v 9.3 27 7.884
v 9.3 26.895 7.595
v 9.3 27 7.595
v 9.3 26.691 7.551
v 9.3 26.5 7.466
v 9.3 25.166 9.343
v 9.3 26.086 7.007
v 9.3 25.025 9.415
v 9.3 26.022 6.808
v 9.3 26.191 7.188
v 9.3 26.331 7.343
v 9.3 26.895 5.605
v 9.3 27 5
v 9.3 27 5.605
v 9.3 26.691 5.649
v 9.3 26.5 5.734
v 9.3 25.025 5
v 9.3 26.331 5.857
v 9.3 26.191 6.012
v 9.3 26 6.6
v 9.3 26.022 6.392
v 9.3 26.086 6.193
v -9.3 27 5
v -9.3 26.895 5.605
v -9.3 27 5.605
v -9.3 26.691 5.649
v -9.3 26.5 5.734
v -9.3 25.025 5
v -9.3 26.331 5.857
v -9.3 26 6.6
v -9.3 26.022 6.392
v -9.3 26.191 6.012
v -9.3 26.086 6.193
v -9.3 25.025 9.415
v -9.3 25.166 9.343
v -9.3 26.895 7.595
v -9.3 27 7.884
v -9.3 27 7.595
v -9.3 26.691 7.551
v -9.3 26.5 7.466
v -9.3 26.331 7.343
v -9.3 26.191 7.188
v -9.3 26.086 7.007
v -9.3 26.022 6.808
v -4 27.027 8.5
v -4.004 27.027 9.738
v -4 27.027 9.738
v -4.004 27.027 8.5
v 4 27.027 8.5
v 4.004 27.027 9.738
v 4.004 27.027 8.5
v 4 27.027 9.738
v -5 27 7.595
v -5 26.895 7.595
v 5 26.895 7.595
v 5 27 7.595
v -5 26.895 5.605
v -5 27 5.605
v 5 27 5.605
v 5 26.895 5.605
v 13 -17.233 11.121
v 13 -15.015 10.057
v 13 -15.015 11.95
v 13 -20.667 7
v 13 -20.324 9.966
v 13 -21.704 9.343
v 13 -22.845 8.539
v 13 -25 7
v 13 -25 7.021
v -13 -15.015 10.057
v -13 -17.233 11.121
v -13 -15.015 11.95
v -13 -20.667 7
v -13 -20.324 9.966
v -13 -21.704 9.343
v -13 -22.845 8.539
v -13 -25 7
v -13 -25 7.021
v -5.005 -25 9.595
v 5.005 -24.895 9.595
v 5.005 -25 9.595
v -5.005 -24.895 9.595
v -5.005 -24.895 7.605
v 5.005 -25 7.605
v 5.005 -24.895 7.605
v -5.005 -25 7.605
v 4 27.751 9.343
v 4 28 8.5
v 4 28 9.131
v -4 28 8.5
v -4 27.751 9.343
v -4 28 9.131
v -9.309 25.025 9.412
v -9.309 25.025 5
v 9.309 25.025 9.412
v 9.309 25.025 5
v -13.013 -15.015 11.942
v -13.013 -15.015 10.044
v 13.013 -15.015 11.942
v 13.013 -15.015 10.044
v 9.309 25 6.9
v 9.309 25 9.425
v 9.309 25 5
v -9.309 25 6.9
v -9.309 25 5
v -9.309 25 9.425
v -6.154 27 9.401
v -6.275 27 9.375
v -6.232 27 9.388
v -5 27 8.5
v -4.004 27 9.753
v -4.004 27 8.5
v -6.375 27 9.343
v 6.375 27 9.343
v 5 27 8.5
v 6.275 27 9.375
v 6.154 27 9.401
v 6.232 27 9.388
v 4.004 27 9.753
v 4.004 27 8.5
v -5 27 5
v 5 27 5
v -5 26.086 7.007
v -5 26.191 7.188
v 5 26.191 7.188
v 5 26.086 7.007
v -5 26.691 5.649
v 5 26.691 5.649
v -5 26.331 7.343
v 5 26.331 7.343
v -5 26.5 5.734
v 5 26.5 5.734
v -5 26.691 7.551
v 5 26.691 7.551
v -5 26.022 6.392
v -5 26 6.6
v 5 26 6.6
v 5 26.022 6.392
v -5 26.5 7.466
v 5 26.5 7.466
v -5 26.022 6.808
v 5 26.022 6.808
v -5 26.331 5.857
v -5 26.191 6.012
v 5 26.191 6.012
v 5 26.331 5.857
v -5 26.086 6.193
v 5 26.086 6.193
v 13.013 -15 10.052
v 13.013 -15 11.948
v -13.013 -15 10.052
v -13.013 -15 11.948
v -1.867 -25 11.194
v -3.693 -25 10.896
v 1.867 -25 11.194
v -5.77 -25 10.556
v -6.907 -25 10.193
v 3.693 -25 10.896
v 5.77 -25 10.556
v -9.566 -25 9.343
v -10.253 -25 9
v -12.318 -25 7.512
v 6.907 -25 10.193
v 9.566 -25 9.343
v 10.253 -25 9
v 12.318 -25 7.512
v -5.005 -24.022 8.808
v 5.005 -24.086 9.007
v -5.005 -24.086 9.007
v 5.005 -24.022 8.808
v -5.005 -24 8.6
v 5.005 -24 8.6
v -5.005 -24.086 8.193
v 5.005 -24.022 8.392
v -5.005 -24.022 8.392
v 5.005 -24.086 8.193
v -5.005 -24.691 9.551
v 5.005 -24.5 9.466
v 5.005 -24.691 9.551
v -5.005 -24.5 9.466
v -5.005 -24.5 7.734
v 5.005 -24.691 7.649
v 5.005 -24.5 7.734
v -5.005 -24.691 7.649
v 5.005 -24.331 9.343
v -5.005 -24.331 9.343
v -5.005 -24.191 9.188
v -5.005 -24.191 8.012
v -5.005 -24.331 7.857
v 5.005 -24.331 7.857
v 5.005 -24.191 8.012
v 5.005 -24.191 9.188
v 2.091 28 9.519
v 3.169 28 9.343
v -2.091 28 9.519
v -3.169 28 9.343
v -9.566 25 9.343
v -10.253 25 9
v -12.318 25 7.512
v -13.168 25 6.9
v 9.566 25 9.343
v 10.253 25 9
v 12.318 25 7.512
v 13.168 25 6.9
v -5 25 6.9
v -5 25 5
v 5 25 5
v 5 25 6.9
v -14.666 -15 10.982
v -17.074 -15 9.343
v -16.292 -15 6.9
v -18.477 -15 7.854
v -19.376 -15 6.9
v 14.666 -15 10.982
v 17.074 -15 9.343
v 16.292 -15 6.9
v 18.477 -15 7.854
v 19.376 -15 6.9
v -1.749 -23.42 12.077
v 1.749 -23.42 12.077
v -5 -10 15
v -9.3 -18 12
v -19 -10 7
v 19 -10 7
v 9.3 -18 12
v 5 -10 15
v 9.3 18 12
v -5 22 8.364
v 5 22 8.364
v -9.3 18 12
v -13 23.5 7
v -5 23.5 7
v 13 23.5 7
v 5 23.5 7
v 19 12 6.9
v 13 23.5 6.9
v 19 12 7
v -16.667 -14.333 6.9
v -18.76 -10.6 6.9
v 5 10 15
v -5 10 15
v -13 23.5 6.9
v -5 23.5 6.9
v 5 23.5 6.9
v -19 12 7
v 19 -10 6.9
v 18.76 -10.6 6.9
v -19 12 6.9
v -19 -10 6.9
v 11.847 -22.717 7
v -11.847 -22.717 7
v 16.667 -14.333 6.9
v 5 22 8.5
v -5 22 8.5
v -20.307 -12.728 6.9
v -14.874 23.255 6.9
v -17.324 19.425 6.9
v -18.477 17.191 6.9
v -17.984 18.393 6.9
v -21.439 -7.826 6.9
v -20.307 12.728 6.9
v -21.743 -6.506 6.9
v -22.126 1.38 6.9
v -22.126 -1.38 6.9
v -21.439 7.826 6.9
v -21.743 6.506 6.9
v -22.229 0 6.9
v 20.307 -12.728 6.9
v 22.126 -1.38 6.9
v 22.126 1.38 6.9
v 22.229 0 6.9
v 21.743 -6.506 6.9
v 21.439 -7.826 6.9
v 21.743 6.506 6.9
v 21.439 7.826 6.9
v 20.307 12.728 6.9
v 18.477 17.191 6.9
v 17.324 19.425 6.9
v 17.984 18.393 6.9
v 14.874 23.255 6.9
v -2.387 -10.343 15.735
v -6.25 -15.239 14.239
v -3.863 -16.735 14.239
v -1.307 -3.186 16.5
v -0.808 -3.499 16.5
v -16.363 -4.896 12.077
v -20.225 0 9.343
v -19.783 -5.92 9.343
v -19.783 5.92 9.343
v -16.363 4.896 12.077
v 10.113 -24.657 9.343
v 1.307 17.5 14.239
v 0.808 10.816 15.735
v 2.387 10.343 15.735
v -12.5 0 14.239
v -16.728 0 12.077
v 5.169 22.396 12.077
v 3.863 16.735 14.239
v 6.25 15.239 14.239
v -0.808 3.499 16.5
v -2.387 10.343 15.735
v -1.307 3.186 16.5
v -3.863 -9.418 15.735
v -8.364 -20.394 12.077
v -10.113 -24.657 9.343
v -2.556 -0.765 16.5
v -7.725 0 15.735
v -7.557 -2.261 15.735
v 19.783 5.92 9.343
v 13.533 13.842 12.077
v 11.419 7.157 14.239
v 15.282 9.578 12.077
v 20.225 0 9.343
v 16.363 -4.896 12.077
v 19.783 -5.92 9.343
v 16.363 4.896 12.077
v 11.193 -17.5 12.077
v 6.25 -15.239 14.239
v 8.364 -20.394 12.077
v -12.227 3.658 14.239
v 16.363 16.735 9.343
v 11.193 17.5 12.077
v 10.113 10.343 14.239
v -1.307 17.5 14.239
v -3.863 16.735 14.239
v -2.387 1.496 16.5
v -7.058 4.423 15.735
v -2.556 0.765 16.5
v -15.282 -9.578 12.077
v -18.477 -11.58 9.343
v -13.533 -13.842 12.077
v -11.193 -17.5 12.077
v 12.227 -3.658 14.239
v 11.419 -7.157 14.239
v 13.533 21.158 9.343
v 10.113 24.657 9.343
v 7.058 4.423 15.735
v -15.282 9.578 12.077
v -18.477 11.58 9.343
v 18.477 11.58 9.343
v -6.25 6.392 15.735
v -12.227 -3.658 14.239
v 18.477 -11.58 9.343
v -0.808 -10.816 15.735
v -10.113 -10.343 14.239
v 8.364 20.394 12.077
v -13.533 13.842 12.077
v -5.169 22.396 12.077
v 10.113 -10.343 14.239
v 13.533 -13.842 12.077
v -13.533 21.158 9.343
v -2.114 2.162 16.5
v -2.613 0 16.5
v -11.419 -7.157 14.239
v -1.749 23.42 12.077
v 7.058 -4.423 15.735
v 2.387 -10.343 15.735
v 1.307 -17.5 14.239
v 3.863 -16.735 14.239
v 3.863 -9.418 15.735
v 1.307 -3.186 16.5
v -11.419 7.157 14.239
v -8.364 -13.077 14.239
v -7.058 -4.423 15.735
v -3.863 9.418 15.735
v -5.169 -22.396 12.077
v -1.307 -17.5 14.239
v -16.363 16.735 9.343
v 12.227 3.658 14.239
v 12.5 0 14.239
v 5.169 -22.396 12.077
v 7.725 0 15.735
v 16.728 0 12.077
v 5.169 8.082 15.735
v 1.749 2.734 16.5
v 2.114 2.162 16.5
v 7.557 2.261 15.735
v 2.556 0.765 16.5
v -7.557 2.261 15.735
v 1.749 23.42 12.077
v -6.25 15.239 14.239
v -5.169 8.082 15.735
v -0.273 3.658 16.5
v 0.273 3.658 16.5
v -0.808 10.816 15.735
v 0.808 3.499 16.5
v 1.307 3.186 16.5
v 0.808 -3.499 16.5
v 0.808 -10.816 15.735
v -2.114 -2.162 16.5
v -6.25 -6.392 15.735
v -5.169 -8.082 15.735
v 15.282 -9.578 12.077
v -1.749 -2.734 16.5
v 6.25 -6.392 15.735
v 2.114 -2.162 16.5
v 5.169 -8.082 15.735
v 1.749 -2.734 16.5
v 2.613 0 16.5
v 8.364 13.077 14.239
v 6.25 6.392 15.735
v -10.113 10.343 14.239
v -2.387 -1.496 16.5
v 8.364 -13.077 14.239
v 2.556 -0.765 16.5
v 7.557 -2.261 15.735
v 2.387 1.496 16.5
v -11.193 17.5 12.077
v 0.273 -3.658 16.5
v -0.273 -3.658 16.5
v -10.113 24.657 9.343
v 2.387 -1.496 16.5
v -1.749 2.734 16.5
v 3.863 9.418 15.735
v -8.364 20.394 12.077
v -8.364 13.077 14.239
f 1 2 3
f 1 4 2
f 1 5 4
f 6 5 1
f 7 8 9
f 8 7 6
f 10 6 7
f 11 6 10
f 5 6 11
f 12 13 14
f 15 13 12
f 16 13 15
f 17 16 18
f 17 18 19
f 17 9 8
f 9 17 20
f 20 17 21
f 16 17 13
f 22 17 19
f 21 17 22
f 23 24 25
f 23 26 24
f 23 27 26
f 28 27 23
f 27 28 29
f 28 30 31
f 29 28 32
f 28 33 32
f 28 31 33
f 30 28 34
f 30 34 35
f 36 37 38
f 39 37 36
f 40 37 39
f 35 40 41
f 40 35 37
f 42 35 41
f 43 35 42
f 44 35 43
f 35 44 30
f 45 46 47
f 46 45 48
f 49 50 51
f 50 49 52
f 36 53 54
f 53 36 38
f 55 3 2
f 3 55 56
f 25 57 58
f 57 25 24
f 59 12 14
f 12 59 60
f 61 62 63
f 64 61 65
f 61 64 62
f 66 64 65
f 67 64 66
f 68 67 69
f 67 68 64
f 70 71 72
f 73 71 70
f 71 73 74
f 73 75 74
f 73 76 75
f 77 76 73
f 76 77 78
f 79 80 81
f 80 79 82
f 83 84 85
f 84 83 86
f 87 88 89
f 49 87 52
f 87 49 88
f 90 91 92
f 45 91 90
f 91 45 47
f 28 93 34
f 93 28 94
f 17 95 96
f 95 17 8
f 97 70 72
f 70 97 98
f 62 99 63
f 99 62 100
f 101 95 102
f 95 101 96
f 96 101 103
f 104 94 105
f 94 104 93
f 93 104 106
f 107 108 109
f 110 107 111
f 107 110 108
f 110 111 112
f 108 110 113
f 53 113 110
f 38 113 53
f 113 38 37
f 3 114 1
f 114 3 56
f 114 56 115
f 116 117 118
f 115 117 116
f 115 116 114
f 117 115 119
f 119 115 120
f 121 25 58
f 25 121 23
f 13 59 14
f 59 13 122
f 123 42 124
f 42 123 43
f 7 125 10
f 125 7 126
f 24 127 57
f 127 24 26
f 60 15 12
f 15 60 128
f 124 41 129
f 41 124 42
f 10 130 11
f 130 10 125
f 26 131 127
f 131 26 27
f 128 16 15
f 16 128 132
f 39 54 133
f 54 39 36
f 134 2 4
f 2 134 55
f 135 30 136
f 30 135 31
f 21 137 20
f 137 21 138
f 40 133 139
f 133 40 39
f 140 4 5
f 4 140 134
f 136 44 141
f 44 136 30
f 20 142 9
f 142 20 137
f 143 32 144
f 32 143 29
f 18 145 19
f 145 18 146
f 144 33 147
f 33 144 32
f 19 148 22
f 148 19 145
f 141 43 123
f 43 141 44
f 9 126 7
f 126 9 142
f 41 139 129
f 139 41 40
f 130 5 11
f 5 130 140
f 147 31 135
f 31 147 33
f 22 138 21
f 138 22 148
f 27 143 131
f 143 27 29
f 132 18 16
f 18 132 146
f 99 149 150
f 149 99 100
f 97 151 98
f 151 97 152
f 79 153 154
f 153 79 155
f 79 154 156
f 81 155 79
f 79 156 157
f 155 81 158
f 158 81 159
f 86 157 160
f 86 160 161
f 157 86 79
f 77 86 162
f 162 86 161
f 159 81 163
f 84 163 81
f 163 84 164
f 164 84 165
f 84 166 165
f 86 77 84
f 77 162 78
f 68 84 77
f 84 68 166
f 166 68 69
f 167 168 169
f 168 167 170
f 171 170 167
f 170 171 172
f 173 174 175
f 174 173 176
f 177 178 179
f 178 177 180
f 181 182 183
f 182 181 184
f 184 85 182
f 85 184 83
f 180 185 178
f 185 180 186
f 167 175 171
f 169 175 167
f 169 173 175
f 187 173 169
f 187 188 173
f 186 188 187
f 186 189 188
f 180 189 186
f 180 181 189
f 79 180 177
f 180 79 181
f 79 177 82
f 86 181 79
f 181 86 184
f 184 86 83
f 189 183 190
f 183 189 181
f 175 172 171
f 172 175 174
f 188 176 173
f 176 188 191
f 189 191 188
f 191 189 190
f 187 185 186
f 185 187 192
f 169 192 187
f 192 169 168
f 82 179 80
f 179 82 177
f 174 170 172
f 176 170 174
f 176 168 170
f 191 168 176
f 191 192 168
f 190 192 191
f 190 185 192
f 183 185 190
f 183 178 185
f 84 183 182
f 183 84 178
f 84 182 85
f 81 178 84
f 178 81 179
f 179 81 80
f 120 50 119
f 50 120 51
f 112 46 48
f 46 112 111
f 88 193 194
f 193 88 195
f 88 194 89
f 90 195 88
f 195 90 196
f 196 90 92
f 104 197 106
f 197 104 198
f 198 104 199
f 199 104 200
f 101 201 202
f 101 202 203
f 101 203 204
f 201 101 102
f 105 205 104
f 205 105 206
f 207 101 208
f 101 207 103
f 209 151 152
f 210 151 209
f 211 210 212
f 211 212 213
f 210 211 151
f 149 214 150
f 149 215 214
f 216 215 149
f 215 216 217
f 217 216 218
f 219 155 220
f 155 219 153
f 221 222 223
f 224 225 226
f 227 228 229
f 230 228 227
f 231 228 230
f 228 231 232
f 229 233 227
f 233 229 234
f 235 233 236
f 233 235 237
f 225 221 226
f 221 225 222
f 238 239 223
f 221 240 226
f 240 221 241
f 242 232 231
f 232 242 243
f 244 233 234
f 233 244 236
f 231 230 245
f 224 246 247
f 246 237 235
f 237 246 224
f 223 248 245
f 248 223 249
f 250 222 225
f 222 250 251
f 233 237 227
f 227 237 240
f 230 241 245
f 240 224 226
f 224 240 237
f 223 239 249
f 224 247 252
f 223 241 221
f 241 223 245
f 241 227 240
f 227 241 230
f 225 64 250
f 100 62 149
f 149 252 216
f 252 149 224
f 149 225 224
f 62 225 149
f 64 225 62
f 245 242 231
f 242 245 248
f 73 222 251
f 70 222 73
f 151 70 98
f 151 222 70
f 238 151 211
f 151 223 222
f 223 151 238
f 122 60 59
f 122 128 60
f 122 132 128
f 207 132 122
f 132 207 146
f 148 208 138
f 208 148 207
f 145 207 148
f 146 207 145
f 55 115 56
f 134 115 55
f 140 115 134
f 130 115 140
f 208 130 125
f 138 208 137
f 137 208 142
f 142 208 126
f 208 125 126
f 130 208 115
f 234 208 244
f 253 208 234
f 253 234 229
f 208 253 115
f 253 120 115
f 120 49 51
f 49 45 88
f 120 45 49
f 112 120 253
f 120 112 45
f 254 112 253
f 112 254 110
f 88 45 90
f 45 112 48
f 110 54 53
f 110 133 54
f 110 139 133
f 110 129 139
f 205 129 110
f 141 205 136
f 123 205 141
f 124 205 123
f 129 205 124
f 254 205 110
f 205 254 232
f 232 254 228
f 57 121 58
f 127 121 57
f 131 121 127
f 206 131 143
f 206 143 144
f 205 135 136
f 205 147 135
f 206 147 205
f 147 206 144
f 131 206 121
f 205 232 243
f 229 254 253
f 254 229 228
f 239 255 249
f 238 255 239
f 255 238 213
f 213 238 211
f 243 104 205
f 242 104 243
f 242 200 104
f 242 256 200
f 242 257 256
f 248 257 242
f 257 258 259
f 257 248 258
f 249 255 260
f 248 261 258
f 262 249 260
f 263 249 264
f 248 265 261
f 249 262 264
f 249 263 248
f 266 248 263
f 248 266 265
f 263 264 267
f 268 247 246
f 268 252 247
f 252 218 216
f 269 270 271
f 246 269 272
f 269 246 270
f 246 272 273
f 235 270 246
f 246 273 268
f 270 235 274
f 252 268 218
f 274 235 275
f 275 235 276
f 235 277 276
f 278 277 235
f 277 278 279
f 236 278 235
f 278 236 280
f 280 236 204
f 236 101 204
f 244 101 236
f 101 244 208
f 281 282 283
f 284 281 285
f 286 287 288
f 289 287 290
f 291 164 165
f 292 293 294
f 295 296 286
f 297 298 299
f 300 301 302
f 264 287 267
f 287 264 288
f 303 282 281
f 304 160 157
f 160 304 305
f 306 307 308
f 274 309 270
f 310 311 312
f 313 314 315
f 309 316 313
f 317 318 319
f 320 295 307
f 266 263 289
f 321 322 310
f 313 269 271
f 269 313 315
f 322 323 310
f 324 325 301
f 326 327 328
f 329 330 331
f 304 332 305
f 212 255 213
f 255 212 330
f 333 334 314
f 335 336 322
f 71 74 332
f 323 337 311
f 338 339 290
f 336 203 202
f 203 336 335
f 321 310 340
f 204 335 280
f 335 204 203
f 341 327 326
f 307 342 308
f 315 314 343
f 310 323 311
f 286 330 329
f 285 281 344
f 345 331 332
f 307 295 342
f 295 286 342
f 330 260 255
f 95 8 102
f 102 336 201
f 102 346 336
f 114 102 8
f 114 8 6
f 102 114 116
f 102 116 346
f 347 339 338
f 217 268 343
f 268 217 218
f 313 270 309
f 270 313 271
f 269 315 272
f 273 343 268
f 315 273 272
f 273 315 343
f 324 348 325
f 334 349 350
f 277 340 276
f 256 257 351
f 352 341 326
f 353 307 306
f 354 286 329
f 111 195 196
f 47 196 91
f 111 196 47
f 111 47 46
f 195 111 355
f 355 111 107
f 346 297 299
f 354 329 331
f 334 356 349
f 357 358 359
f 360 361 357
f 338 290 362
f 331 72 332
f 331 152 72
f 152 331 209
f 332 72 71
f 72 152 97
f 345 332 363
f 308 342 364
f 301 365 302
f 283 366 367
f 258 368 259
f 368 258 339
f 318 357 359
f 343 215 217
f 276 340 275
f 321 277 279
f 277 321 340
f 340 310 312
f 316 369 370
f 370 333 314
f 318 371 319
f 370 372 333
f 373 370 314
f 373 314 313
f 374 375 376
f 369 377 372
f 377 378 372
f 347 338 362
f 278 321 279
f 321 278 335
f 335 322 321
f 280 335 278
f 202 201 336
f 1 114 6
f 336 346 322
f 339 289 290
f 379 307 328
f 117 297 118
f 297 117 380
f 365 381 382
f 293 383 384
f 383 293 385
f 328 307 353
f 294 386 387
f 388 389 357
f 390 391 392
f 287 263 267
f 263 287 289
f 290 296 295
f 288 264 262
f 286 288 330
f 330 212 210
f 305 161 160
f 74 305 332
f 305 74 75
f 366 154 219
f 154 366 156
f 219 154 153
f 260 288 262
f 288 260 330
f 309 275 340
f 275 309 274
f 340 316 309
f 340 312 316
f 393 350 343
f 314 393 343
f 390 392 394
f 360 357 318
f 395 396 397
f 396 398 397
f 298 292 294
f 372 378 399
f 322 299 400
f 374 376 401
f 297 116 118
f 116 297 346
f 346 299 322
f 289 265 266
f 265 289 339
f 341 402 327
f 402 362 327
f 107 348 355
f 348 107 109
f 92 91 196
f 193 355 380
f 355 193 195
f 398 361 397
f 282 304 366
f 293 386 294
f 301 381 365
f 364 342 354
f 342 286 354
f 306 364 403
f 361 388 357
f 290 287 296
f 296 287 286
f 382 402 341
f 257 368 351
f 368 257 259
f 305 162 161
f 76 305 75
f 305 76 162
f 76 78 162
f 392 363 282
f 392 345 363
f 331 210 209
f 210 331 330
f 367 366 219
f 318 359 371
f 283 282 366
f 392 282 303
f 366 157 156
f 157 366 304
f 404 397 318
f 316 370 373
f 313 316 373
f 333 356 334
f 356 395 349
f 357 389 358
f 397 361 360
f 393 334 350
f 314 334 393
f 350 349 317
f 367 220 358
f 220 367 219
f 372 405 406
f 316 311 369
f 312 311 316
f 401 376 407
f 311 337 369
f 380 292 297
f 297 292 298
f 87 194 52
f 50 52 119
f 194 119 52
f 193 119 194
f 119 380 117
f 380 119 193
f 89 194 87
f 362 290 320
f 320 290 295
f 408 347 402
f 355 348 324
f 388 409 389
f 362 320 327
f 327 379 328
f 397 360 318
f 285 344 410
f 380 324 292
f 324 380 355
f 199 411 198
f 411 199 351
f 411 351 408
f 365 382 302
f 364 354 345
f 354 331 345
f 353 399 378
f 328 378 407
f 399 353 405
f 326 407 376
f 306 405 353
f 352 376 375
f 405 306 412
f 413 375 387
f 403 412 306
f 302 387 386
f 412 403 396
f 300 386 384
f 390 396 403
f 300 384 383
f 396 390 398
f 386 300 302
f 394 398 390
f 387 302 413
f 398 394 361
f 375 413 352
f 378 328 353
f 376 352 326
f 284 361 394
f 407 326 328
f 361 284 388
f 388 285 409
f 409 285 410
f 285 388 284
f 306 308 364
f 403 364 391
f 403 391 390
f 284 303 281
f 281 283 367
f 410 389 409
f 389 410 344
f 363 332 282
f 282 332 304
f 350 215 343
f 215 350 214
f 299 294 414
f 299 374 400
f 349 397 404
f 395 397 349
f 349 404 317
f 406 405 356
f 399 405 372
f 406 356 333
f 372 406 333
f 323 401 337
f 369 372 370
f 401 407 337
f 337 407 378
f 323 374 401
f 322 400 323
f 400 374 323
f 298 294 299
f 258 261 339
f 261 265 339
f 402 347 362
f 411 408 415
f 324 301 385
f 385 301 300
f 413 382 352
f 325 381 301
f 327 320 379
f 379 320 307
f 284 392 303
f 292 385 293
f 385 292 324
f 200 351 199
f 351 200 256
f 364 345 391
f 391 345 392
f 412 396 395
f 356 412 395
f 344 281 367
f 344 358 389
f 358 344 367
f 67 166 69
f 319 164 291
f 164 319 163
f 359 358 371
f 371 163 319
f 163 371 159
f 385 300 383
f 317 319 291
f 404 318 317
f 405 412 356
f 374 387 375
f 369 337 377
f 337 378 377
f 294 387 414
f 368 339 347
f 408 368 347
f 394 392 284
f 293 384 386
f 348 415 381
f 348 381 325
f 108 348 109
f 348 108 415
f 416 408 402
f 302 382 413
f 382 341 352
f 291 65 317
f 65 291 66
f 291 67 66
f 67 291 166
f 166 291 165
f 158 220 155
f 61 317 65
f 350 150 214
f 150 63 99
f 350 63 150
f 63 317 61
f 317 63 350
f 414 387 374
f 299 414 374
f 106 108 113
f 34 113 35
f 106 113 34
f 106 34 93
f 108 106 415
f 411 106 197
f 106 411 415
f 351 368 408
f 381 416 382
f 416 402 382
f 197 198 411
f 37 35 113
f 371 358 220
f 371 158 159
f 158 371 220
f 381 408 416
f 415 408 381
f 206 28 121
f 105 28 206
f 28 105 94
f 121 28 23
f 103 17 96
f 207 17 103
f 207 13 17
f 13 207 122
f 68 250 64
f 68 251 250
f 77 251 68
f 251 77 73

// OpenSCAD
$fn=30;

spacer=0.4;

//case();
// translate([0,5,11]) nano();
lid();
//translate([0,5,10]) nanoTop();

module case()
{
    difference()
    {
        translate([0,0,-1]) resize(newsize=[50,70,35]) sphere(r=60, center=true);
        translate([0,0,-10]) resize(newsize=[100,140,20]) sphere(r=80, center=true);
        //translate([0,0,-50]) cube([100,100,100], center=true);
        translate([0,5,10.2]) nano();
    }
}


module lid()
{
    difference()
    {
        translate([0,0,-1]) resize(newsize=[50,70,35]) sphere(r=60, center=true);
        translate([0,0,-10]) resize(newsize=[100,140,20]) sphere(r=80, center=true);
        //translate([0,0,-50]) cube([100,100,100], center=true);
        scale([1,1.001,1]) case();
        scale([1.001,1,1]) case();
        translate([0,5,10]) nanoTop();
        translate([0,0,-5]) cube([100,100,20], center=true);
        translate([0,-24,-3]) cube([50,10,20], center=true);
    }
}

module nanoTop()
{
//    difference()
//    {
       // translate([0,5,11]) nano();
        //translate([0,0,20]) cube([100,100,40], center=true);
        //translate([0,0,-30]) cube([100,100,40], center=true);
//    }
    
    hull()
    {
         //Arudino
        translate([0,-5,-5])
        difference()
        {
            cube([18.6,36,10], center=true);
            //translate([0,22,-5])  cube([10,2,2], center=true);
            translate([0,22,-4.6]) rotate([90,0,90]) cylinder(r=1, h=19, center=true);
        }
        
        //Wireless card
        translate([0,-5,-4]) cube([18.6,36,12], center=true);
        translate([0,-5,-1]) cube([10,20,12], center=true);
        
        //Gyro
        //translate([0,-22,3])  cube([26,16,20], center=true);
        translate([0,-22,-8])
        difference()
        {
            cube([26,16,5], center=true);
            //translate([0,22,-5])  cube([10,2,2], center=true);
            translate([0,-8,-6.6]) rotate([90,0,90]) cylinder(r=1, h=10, center=true);
        }
        translate([0,-20,-5.8]) cube([24,16,5], center=true);
        //translate([0,-20,-5.5]) cube([24,16,5], center=true);
    
        //Hollowing out cubes
        translate([0,-3.5,-4.5]) cube([26,44,3], center=true);
        translate([0,-4,-4.5]) cube([38,22,3], center=true);
    }
        
    //Micro usb connector
    //translate([0,22,0])  cube([10,4,14], center=true);
    translate([0,22,-4.5])  cube([10,10,6], center=true);
    //translate([0,22,-2])  cube([10,30,10], center=true);
    translate([0,32,0])  cube([40,18,30], center=true);
    
    
    //Arduino pins
    translate([0,0,-5.6]) cube([60,40,5], center=true);

}

module nano()
{
    //Arudino
    difference()
    {
        cube([18.6,44,20], center=true);
        //translate([0,22,-5])  cube([10,2,2], center=true);
        translate([0,22,-3.6]) rotate([90,0,90]) cylinder(r=1, h=19, center=true);
    }
        
    //Micro usb connector
    translate([0,22,0])  cube([8,18,12], center=true);
    translate([0,32,0])  cube([40,18,30], center=true);
    
    //Arduino pins
    cube([50,40,20], center=true);
    
    //holes
    translate([8,20,0]) cylinder(r=1, h=30, center=true);
    translate([5,20,0]) cylinder(r=1, h=30, center=true);
    
    translate([-8,20,0]) cylinder(r=1, h=30, center=true);
    translate([-5,20,0]) cylinder(r=1, h=30, center=true);
        
    translate([8,-20,0]) cylinder(r=1, h=30, center=true);
    translate([5,-20,0]) cylinder(r=1, h=30, center=true);
    
    translate([-8,-20,0]) cylinder(r=1, h=30, center=true);
    translate([-5,-20,0]) cylinder(r=1, h=30, center=true);
    
    //side holes
    translate([-20,-3,0]) cylinder(r=1, h=30, center=true);
    translate([-20,-7,0]) cylinder(r=1, h=30, center=true);
    
    translate([20,-3,0]) cylinder(r=1, h=30, center=true);
    translate([20,-7,0]) cylinder(r=1, h=30, center=true);
   
    //Gyro
    //translate([0,-22,3])  cube([26,16,20], center=true);
    translate([0,-22,3])
    difference()
    {
        cube([26,16,20], center=true);
        
        //translate([0,22,-5])  cube([10,2,2], center=true);
        translate([0,-8,-4.6]) rotate([90,0,90]) cylinder(r=1, h=10, center=true);
    }
    
     hull()
        {
            translate([0,-22,-4]) cube([26,16,0.1], center=true);
            translate([0,-23,-6]) cube([26.6,16,2], center=true);
        }
    
    //translate([0,-23,-6]) cube([26.6,16,2], center=true);
    
}
